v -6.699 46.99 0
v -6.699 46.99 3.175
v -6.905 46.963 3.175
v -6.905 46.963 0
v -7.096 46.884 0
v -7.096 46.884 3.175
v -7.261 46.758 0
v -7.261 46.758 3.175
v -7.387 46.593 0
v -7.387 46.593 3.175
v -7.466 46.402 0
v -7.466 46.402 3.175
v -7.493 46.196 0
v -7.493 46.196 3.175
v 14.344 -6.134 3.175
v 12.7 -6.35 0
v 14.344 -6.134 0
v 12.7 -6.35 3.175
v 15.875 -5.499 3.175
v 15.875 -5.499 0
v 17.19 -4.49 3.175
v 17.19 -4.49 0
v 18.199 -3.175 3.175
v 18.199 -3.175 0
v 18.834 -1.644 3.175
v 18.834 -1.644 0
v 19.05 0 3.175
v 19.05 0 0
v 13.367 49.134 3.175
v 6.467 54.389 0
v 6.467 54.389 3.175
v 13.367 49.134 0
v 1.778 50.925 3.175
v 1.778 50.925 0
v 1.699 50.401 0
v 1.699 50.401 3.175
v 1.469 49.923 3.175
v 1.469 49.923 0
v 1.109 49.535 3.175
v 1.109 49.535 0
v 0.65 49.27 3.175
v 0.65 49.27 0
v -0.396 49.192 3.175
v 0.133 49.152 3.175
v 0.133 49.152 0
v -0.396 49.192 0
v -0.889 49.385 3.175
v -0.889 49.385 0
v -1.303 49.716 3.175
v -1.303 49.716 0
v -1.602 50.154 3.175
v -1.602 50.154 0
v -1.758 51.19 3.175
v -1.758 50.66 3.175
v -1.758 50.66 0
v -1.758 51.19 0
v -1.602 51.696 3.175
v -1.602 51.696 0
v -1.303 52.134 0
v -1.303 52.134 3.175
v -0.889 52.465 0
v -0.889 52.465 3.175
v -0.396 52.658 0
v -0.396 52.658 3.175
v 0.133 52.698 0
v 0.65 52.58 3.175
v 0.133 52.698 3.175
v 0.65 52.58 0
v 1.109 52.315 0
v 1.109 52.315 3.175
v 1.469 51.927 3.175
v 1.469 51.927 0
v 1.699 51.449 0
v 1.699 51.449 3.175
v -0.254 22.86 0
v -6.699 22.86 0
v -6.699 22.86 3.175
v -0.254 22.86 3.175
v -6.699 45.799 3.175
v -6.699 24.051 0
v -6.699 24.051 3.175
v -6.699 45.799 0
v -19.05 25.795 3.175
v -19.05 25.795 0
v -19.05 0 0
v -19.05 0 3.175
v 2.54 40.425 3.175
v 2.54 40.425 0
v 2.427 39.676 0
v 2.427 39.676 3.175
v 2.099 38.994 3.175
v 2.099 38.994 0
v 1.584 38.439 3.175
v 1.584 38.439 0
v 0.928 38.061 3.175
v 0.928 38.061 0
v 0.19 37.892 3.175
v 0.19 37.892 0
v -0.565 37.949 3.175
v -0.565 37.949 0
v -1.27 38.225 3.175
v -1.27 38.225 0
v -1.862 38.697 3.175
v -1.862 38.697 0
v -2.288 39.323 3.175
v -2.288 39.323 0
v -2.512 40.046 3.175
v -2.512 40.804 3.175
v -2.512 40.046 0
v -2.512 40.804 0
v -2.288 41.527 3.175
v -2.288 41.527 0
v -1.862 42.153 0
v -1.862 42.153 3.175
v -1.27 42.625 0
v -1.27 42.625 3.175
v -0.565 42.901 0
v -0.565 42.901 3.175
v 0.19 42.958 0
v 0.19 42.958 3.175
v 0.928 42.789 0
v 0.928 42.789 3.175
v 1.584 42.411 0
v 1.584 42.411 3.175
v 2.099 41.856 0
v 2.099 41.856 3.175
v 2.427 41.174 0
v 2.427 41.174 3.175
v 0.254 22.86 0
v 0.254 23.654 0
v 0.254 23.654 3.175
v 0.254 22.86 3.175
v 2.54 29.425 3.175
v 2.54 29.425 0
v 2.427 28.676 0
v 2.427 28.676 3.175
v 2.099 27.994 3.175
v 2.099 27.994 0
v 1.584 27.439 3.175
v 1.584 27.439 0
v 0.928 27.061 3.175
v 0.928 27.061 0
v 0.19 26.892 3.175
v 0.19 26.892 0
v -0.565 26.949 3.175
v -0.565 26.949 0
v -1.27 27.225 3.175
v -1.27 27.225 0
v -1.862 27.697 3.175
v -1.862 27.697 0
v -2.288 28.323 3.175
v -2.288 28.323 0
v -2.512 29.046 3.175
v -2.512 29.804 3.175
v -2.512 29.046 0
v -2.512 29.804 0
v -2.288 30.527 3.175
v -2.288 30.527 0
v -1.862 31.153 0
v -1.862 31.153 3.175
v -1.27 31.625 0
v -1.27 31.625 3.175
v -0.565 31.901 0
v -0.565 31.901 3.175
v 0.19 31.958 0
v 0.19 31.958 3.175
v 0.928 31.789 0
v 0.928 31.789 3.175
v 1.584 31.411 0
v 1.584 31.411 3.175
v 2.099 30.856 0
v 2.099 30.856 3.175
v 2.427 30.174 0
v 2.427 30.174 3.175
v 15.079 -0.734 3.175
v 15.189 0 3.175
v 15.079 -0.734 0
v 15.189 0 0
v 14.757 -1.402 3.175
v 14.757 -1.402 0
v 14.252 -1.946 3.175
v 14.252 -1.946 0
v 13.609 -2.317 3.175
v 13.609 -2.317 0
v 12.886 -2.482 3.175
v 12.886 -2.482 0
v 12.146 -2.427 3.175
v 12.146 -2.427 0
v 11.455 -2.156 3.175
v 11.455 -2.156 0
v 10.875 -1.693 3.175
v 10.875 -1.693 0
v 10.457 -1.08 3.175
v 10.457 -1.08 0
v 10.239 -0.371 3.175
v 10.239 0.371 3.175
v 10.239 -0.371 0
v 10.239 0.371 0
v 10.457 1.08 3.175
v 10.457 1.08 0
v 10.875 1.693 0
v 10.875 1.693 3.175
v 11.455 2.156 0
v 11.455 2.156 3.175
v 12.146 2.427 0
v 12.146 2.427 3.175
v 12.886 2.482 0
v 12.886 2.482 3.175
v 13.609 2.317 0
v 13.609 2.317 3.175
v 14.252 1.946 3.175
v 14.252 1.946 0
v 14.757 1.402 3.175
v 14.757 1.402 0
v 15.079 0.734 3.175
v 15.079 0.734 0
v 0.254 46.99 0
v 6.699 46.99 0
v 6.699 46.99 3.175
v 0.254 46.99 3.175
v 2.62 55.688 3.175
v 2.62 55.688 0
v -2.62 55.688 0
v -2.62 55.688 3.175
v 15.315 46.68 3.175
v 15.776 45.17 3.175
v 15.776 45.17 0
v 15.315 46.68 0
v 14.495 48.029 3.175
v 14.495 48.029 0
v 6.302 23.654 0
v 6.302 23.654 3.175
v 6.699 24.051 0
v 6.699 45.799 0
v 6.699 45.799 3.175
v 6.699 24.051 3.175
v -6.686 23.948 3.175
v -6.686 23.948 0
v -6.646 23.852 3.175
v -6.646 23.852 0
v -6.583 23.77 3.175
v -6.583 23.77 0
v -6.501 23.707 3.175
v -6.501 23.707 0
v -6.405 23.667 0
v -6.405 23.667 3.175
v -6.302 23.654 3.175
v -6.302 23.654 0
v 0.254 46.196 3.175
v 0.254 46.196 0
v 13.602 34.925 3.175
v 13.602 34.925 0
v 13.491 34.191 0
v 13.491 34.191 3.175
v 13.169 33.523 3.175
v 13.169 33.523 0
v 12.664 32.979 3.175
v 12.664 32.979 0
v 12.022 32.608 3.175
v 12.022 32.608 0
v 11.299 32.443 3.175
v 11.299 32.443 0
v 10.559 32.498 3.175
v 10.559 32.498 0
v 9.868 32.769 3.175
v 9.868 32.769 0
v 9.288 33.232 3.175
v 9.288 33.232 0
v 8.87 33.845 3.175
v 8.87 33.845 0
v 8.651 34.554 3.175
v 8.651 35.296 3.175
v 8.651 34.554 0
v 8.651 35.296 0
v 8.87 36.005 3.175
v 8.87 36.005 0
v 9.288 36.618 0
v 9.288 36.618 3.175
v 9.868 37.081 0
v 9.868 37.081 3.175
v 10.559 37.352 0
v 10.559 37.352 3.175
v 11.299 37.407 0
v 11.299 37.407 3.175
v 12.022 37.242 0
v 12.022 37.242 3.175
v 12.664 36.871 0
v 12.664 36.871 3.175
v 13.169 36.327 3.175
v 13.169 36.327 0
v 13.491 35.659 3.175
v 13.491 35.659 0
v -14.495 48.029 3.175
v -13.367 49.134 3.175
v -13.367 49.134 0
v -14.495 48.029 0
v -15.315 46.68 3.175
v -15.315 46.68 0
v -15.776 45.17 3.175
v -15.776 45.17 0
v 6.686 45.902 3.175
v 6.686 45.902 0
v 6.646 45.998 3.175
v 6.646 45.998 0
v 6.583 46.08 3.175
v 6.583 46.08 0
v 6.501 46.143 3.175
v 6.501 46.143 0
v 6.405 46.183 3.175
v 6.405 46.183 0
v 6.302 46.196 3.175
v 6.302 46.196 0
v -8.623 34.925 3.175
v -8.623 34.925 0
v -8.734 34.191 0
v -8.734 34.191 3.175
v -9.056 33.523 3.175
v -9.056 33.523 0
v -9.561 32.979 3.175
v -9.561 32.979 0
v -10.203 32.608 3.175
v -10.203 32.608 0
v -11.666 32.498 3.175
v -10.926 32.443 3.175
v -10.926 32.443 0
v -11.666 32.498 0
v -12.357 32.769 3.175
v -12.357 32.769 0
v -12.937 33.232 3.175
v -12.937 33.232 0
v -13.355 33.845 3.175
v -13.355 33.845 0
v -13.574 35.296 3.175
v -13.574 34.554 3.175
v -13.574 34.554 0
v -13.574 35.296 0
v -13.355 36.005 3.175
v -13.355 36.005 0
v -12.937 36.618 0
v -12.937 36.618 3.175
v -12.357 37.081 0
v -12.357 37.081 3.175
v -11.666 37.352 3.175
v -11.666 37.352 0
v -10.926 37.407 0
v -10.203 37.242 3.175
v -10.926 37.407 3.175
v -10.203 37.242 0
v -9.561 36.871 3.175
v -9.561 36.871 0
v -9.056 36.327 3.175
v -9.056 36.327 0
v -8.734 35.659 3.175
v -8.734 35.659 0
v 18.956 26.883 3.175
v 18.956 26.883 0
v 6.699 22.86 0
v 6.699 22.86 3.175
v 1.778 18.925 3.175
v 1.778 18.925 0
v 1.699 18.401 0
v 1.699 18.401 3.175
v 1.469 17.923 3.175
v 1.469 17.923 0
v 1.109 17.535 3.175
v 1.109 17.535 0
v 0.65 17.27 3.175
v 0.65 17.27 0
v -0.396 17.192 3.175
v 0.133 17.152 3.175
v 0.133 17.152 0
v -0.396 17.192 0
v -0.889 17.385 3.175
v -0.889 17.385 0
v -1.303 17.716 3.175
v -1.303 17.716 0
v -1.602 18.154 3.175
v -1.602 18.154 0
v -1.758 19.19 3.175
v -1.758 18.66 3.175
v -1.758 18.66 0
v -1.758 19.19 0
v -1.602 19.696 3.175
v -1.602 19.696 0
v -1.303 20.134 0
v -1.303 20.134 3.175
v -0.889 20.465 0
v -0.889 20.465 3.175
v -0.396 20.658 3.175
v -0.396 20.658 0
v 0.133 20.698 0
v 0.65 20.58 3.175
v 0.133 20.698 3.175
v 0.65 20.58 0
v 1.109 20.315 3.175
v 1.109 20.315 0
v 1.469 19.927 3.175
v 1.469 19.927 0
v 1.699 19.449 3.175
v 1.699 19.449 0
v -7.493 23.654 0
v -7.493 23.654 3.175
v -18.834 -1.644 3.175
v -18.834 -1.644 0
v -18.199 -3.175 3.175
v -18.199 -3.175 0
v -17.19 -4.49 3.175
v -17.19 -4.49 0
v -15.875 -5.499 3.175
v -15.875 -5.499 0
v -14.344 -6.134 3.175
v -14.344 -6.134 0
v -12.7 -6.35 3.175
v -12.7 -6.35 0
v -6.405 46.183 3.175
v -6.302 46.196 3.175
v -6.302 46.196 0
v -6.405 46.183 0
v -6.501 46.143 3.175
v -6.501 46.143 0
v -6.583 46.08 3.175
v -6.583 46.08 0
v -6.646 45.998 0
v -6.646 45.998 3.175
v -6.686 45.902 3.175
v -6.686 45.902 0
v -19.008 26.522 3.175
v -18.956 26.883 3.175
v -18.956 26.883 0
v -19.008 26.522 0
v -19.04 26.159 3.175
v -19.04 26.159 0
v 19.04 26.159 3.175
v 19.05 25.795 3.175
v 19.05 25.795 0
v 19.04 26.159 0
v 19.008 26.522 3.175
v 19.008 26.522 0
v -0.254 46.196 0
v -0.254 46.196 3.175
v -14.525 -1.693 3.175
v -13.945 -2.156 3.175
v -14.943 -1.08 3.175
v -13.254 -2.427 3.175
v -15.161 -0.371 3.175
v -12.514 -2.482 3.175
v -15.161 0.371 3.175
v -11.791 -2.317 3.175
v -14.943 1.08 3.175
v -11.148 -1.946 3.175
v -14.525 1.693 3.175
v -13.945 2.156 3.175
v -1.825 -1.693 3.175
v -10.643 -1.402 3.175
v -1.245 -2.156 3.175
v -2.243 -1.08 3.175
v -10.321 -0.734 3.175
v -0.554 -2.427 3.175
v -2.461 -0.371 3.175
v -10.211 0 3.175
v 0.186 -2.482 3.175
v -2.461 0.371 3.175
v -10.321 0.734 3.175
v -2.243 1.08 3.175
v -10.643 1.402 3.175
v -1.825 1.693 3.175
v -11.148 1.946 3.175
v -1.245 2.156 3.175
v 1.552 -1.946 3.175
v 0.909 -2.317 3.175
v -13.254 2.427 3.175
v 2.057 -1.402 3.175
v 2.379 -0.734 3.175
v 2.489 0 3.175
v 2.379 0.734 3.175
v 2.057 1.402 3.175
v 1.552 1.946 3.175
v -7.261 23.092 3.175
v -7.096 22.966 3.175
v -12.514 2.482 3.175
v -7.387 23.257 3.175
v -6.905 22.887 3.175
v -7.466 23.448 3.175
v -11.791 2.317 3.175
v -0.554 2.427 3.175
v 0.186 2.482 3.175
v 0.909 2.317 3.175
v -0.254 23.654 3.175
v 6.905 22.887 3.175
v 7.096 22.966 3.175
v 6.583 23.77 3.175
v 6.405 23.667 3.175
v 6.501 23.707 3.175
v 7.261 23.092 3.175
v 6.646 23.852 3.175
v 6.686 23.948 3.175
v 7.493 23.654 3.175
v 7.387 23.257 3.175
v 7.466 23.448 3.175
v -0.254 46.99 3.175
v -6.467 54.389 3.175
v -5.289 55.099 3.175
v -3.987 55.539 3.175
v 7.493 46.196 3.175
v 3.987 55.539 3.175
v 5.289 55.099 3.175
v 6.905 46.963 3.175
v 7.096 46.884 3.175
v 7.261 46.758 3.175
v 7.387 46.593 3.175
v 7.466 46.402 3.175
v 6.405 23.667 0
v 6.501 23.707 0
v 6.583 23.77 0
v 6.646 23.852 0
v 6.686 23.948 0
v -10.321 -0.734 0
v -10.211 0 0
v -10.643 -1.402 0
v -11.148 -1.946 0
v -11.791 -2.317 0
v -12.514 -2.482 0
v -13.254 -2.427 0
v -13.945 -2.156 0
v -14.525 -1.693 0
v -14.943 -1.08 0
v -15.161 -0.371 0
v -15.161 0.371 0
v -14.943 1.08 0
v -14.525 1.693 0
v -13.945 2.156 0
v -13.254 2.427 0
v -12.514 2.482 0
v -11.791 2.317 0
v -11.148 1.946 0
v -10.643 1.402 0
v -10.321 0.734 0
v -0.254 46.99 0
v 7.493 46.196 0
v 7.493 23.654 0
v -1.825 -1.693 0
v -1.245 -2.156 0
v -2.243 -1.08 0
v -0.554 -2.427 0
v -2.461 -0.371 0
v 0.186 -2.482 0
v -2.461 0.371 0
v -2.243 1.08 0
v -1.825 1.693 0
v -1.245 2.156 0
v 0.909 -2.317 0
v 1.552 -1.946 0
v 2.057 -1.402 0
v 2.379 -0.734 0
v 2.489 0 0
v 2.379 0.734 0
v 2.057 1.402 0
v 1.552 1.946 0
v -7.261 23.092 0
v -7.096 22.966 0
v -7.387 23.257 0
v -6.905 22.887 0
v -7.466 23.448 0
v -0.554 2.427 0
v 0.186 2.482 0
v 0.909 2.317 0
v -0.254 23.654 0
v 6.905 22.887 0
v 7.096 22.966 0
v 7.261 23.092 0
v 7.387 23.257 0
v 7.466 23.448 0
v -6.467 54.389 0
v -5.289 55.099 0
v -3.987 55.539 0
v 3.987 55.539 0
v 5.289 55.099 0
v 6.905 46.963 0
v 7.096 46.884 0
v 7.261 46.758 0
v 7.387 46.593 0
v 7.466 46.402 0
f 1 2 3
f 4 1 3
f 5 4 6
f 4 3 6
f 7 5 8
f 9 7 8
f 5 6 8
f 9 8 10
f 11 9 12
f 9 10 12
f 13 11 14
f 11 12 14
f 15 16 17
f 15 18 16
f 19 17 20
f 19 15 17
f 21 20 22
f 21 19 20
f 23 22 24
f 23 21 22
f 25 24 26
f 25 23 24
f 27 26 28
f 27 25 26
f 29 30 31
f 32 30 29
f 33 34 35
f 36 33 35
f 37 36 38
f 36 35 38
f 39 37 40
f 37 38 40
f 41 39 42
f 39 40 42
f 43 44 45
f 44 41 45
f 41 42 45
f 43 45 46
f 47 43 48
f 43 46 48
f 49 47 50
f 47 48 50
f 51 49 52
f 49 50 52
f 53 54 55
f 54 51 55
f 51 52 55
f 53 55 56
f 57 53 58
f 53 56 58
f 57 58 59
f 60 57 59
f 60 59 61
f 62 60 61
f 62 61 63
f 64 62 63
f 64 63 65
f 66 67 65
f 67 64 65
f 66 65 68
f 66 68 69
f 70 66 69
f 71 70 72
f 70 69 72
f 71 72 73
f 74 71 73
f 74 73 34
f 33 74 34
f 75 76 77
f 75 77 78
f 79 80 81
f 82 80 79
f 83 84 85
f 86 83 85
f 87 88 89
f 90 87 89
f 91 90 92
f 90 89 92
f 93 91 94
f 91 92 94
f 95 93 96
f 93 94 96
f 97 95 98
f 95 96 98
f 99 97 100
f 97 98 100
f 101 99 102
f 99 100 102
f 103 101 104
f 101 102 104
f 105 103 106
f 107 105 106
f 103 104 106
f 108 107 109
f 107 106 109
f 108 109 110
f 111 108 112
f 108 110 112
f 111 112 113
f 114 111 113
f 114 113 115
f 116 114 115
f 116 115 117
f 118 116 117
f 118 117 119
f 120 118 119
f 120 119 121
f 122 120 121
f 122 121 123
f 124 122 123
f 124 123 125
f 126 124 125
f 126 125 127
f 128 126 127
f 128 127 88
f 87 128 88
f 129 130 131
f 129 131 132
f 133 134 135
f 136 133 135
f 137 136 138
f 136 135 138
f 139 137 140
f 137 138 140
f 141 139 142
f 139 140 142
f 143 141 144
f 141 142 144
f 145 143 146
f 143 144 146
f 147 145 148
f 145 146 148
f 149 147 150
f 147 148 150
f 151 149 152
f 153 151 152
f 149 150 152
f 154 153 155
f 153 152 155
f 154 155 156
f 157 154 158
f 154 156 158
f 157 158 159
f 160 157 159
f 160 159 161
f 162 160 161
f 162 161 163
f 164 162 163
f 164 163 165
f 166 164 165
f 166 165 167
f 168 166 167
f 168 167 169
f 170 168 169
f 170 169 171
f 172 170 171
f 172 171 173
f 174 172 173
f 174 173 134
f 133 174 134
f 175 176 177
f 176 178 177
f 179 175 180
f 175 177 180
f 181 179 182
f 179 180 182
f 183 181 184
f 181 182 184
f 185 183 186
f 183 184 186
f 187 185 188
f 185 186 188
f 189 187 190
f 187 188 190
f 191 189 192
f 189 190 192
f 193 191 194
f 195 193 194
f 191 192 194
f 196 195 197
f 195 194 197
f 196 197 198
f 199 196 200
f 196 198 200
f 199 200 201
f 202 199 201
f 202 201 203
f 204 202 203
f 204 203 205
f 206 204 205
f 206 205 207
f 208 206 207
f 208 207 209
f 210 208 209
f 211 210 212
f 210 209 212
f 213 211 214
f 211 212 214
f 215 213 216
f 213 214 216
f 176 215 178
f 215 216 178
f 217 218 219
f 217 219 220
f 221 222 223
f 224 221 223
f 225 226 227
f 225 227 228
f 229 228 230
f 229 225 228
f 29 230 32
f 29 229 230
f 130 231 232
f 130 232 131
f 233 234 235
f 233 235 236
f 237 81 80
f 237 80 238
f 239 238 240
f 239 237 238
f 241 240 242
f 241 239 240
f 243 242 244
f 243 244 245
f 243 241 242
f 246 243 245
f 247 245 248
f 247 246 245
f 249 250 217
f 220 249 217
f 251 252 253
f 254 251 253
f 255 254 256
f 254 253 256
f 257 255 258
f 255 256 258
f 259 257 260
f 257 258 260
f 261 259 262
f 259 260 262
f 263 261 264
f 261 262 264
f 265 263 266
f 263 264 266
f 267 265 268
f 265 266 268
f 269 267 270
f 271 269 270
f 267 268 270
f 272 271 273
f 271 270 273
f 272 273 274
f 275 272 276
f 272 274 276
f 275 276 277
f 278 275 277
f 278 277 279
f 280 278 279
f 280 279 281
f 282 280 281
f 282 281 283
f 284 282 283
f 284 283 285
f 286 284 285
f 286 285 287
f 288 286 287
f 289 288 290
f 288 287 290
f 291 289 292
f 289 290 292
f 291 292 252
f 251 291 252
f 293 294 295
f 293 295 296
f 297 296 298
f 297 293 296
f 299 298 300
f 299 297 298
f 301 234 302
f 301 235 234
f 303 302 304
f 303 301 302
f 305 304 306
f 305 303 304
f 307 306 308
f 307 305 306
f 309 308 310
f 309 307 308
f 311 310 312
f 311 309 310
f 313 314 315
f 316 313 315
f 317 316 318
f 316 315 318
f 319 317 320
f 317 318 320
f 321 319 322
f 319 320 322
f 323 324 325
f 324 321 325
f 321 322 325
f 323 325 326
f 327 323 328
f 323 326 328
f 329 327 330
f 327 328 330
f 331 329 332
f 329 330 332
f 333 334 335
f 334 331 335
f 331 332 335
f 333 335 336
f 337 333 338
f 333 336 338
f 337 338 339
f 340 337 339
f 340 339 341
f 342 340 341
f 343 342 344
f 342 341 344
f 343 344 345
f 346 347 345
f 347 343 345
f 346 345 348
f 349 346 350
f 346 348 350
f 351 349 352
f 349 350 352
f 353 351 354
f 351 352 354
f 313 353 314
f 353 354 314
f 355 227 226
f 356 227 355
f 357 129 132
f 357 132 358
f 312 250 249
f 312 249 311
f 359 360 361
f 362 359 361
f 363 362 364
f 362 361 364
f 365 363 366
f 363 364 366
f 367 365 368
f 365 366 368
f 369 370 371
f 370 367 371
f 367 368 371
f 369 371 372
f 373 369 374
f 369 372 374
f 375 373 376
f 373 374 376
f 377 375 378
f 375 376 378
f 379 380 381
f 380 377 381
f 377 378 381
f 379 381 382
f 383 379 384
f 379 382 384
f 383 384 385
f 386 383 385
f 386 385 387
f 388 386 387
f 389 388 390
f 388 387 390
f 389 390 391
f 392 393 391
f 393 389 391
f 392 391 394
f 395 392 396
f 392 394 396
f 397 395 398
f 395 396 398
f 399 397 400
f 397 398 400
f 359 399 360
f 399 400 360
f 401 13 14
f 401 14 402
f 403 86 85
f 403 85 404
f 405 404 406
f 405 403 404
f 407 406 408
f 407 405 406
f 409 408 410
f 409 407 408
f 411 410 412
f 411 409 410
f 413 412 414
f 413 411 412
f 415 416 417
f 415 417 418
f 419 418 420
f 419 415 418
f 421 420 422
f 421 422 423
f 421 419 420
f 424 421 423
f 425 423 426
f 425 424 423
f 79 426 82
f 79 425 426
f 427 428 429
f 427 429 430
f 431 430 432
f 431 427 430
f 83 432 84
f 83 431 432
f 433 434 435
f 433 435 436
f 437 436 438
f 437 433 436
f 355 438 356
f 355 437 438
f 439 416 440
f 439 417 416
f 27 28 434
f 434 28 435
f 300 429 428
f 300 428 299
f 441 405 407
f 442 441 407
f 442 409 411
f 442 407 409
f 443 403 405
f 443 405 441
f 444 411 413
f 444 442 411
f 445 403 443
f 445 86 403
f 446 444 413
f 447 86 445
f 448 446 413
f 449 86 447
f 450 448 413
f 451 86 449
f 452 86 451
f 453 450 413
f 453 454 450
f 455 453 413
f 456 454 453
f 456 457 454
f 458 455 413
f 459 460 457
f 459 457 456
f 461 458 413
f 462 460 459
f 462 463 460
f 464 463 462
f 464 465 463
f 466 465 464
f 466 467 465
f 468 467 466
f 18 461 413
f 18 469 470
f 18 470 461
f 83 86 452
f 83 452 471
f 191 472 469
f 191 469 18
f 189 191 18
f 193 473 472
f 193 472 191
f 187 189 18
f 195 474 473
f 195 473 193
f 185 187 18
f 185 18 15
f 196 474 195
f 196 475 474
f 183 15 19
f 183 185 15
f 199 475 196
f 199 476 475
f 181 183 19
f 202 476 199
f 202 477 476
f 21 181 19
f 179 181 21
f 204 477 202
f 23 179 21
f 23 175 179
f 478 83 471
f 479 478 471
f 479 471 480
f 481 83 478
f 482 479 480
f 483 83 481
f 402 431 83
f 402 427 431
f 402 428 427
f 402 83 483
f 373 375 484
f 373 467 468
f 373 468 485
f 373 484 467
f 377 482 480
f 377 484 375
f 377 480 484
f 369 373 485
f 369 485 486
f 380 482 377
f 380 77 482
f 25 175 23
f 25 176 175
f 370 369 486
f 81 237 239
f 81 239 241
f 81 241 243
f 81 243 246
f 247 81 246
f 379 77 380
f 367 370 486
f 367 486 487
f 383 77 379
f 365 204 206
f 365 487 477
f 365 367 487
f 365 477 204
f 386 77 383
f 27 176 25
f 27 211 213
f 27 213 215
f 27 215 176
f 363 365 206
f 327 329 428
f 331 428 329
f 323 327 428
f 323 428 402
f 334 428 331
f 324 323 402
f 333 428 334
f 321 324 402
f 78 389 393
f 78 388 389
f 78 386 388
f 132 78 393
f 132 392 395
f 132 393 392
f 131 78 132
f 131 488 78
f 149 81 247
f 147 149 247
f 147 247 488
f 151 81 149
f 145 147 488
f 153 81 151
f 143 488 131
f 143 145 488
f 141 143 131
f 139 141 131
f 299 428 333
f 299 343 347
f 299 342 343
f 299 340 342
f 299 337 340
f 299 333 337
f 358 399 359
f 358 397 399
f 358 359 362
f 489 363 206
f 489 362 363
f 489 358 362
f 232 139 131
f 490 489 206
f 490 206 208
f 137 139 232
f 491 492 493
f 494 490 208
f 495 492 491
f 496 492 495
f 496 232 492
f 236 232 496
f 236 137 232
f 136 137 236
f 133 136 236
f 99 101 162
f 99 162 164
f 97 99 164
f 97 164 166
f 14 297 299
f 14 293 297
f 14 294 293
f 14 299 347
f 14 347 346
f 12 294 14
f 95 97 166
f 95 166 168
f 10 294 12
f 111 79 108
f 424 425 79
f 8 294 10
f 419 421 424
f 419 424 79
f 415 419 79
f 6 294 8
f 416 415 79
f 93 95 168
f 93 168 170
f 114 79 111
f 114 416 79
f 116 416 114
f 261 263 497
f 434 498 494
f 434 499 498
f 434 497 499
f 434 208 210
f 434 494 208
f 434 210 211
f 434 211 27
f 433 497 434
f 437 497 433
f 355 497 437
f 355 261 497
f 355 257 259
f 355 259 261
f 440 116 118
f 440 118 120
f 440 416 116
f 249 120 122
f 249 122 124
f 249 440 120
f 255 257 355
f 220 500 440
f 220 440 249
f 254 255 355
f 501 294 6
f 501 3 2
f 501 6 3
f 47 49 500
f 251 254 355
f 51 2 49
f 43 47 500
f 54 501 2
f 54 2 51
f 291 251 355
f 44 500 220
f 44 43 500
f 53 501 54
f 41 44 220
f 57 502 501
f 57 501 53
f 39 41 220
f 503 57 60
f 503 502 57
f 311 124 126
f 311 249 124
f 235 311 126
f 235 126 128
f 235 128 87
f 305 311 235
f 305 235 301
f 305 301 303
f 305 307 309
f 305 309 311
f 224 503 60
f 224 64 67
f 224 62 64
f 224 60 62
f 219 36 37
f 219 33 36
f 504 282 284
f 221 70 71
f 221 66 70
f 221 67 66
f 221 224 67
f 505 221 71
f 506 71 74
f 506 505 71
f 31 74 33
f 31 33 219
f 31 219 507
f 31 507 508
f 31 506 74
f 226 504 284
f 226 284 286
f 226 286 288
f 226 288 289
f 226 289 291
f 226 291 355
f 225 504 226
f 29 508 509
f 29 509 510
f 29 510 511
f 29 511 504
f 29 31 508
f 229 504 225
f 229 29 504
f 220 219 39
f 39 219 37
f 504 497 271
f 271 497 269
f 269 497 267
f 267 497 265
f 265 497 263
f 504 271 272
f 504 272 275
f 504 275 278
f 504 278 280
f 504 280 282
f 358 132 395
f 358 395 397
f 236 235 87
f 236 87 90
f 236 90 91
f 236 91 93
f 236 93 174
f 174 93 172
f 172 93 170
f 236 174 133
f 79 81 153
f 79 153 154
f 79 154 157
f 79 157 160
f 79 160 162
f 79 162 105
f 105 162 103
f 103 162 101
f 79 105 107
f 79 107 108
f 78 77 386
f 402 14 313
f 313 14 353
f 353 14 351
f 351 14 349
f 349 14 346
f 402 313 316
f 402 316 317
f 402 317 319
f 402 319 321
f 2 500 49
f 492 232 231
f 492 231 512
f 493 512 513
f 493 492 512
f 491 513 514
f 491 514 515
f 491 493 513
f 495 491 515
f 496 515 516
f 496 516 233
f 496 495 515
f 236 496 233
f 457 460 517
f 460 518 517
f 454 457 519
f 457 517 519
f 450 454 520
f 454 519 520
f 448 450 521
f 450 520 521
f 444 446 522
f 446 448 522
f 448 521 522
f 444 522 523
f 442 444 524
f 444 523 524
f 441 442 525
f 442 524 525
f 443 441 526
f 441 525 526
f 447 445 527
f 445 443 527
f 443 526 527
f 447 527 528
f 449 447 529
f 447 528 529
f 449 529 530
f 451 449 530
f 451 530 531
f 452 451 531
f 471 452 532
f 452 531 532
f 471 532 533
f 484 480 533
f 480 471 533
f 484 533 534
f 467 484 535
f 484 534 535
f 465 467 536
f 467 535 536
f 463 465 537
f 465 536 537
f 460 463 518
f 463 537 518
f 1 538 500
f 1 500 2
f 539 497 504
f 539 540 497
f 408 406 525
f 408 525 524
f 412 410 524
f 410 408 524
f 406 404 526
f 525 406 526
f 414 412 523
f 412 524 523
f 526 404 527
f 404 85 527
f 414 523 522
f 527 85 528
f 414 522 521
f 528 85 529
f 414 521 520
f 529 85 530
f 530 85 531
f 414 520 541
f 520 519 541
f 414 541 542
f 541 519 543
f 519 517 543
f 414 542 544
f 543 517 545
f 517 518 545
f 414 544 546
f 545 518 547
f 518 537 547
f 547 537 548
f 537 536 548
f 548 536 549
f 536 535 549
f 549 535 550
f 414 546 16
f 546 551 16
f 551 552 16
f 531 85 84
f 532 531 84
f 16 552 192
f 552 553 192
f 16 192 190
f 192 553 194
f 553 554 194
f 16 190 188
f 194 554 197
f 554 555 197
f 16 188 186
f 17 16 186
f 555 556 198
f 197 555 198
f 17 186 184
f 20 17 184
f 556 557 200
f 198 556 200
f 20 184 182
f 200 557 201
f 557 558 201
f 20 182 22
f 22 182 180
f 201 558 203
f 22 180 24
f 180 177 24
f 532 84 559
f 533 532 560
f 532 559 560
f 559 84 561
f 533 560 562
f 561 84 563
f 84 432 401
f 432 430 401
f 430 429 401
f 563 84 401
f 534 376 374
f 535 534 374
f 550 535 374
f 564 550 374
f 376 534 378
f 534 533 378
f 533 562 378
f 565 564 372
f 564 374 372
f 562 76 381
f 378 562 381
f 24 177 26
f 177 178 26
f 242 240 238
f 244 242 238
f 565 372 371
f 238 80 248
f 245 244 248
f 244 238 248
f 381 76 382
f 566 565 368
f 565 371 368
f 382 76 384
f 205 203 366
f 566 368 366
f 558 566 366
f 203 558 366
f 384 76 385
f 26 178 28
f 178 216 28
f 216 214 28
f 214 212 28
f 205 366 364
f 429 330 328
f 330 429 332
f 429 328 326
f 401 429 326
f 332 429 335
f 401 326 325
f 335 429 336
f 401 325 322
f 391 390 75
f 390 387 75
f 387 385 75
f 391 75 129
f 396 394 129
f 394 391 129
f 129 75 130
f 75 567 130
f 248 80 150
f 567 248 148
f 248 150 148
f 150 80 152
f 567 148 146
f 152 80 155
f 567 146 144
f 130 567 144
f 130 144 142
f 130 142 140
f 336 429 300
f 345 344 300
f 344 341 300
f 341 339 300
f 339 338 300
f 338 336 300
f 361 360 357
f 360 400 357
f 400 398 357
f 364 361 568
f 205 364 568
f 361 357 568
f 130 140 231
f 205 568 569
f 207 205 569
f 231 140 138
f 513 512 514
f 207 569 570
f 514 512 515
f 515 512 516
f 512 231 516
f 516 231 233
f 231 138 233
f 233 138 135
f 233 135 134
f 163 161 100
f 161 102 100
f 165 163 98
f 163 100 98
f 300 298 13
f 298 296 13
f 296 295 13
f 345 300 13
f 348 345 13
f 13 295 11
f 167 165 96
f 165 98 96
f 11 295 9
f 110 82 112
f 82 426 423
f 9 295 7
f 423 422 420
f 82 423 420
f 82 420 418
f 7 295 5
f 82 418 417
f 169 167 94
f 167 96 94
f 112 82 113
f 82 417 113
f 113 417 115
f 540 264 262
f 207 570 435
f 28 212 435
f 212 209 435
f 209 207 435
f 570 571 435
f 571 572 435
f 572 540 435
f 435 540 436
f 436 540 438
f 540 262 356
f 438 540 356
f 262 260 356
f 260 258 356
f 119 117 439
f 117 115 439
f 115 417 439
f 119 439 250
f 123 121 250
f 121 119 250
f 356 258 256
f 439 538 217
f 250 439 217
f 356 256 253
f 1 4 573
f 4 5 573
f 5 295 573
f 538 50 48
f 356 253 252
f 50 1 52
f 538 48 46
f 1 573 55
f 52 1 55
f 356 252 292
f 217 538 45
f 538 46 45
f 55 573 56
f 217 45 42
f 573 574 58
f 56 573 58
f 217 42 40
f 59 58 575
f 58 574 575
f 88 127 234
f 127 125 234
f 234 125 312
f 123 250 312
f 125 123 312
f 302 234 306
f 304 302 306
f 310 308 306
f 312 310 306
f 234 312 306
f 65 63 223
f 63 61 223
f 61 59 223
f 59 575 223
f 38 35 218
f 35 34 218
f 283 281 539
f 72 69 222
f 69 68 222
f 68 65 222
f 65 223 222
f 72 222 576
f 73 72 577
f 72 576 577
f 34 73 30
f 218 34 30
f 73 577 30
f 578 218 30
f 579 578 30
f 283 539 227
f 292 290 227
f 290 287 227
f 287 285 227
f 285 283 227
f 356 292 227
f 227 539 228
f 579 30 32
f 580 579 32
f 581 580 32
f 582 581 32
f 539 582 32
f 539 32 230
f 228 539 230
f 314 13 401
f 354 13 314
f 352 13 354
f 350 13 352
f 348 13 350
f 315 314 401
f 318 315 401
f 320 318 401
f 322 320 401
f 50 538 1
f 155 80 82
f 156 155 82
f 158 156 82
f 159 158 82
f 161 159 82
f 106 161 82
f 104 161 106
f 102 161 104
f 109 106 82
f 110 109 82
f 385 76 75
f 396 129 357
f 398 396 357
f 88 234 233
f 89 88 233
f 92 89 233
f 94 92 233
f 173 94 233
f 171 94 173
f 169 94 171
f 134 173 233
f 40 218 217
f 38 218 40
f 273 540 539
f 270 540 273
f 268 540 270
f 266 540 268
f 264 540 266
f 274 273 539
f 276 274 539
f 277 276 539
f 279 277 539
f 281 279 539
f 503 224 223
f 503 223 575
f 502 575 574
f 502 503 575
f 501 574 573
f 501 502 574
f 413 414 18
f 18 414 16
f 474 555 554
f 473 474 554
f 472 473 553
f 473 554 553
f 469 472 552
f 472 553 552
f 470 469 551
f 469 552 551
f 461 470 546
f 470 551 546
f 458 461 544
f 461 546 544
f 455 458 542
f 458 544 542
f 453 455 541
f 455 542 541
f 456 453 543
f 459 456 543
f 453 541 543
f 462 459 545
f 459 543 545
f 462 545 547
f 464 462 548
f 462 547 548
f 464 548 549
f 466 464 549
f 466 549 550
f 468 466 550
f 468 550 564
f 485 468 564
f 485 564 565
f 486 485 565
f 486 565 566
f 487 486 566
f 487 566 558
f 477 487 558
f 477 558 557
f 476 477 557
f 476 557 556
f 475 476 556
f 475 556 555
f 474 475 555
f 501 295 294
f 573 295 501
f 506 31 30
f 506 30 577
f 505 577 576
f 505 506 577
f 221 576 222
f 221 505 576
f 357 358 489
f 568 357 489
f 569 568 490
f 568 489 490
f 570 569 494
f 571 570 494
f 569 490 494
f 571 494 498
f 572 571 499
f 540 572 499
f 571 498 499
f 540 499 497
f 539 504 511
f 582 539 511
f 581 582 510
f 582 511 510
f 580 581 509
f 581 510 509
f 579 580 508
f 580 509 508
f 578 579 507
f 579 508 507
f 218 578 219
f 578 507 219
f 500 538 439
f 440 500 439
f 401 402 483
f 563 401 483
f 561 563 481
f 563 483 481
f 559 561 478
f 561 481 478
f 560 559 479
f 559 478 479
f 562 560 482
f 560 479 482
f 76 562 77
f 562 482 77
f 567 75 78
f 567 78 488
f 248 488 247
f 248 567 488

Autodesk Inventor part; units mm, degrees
ref_plane "YZ Plane" through (0, 0, 0) normal (1, 0, 0) x (0, 1, 0)
ref_plane "XZ Plane" through (0, 0, 0) normal (0, 1, 0) x (-1, 0, 0)
ref_plane "XY Plane" through (0, 0, 0) normal (0, 0, 1) x (1, 0, 0)
sketch "Sketch1" plane through (0, 0, 0) normal (0, 0, 1) x (1, 0, 0)
  line L0 (19.05, 12.7) -> (-19.05, 12.7)
  line L1 (-19.05, 12.7) -> (-19.05, -12.7)
  line L2 (-19.05, -12.7) -> (19.05, -12.7)
  line L3 (19.05, -12.7) -> (19.05, 12.7)
  circle A0 centre (-12.7, 0) radius 2.4892
  line L4 (-12.7, 0) -> (12.7, 0)
  circle A1 centre (12.7, 0) radius 2.4892
  line L5 (-19.05, -6.35) -> (19.05, -6.35)
  circle A2 centre (-11.1125, 34.925) radius 2.4892
  line L6 (-11.1125, 34.925) -> (11.1125, 34.925)
  circle A3 centre (11.1125, 34.925) radius 2.4892
  line L7 (-19.05, 12.7) -> (-19.05, 26.343)
  line L8 (-19.05, 26.343) -> (-15.3495, 47.625)
  line L9 (-15.3495, 47.625) -> (15.3495, 47.625)
  line L10 (15.3495, 47.625) -> (19.05, 26.343)
  line L11 (19.05, 26.343) -> (19.05, 12.7)
  circle A4 centre (-11.1125, 34.925) radius 6.35 construction
  circle A5 centre (0, 29.425) radius 2.54
  circle A6 centre (0, 40.425) radius 2.54
  line L12 (0, 40.425) -> (0, 29.425)
  circle A7 centre (0, 0) radius 2.4892
  line L13 (7.493, 46.99) -> (-7.493, 46.99)
  line L14 (-7.493, 46.99) -> (-7.493, 22.86)
  line L15 (-7.493, 22.86) -> (7.493, 22.86)
  line L16 (7.493, 22.86) -> (7.493, 46.99)
  line L17 (7.493, 46.99) -> (-7.493, 22.86) construction
  line L18 (-7.493, 46.99) -> (7.493, 22.86) construction
  circle A8 centre (0, 50.925) radius 1.778
  circle A9 centre (0, 18.925) radius 1.778
  line L19 (-15.3495, 47.625) -> (-4.7625, 55.6875)
  line L20 (4.7625, 55.6875) -> (15.3495, 47.625)
  line L21 (-7.493, 34.925) -> (7.493, 34.925) construction
  line L22 (-7.493, 37.3062) -> (7.493, 37.3062)
  line L23 (-7.493, 34.1313) -> (7.493, 34.1313)
  line L24 (4.7625, 55.6875) -> (-4.7625, 55.6875)
  line L25 (7.493, 37.3062) -> (7.493, 34.1313)
  line L26 (-7.493, 37.3062) -> (-7.493, 34.1313)
  line L27 (-6.6992, 46.1963) -> (6.6992, 46.1963)
  line L28 (6.6992, 46.1963) -> (6.6992, 23.6537)
  line L29 (6.6992, 23.6537) -> (-6.6992, 23.6537)
  line L30 (-6.6992, 23.6537) -> (-6.6992, 46.1963)
  line L31 (0.254, 46.99) -> (-0.254, 46.99)
  line L32 (-0.254, 46.99) -> (-0.254, 46.1963)
  line L33 (-0.254, 46.1963) -> (0.254, 46.1963)
  line L34 (0.254, 46.1963) -> (0.254, 46.99)
  line L35 (0.254, 46.99) -> (-0.254, 46.1963) construction
  line L36 (-0.254, 46.99) -> (0.254, 46.1963) construction
  line L37 (0.254, 22.86) -> (-0.254, 22.86)
  line L38 (-0.254, 22.86) -> (-0.254, 23.6537)
  line L39 (-0.254, 23.6537) -> (0.254, 23.6537)
  line L40 (0.254, 23.6537) -> (0.254, 22.86)
  line L41 (0.254, 22.86) -> (-0.254, 23.6537) construction
  line L42 (-0.254, 22.86) -> (0.254, 23.6537) construction
  point P0 (0, 12.7)
  point P1 (0, 47.625)
  point P2 (0, 34.925)
  point P3 (0, 34.925)
  point P4 (0, 34.925)
  point P5 (-7.493, 34.1313)
  point P6 (7.493, 34.1313)
  point P7 (7.493, 37.3062)
  point P8 (-7.493, 37.3062)
  point P9 (0, 55.6875)
  point P10 (0, -12.7)
  point P11 (0, 46.5931)
  point P12 (0, 46.5931)
  point P13 (0, 23.2569)
  point P14 (0, 23.2569)
  dimension "d0" = 38.1
  dimension "d1" = 25.4
  dimension "d2" = 4.9784
  dimension "d3" = 4.9784
  dimension "d4" = 25.4
  dimension "d5" = 6.35
  dimension "d6" = 4.9784
  dimension "d7" = 22.225
  dimension "d8" = 22.225
  dimension "d9" = 21.282
  dimension "d10" = 12.7
  dimension "d11" = 12.7
  dimension "d12" = 5.08
  dimension "d13" = 11
  dimension "d17" = 24.13
  dimension "d18" = 14.986
  dimension "d19" = 3.556
  dimension "d22" = 360
  dimension "d24" = 32
  dimension "d29" = 0.7937
  dimension "d31" = 3.175
  dimension "d32" = 4.7625
  dimension "d33" = 9.525
  dimension "d51" = 12.7
  dimension "d52" = 6.35
  dimension "d53" = 0.7937
  dimension "d54" = 0.508
extrude "Plate1" add sketch "Sketch1" along normal blind 3.175 contours L3 L5 L1 L0 | L0 L7 L8 L9 L10 L11 | L9 L19 L24 L20 | L30 L22 L12 L6 | L6 L12 L23 L30 | L12 L22 L28 L6 | L6 L28 L23 L12 | L23 L28 L29 L30 | L30 L27 L28 L22 | L13 L34 L27 L32 | L38 L29 L40 L15
fillet "Corner Round2" radius 6.35 8 edges at (19.05, -6.35, 1.5875) (-19.05, -6.35, 1.5875) (19.05, 26.343, 1.5875) (-15.3495, 47.625, 1.5875) (-4.7625, 55.6875, 1.5875) (4.7625, 55.6875, 1.5875) (15.3495, 47.625, 1.5875) (-19.05, 26.343, 1.5875)
cut "Cut1" [suppressed]
fillet "Corner Round3" radius 0.7937 4 edges at (-7.493, 46.99, 1.5875) (-7.493, 22.86, 1.5875) (7.493, 22.86, 1.5875) (7.493, 46.99, 1.5875)
fillet "Corner Round4" radius 0.3969 4 edges at (6.6992, 46.1963, 1.5875) (-6.6992, 46.1963, 1.5875) (-6.6992, 23.6537, 1.5875) (6.6992, 23.6537, 1.5875)
sketch "Sketch4" plane through (0, 0, 3.175) normal (0, 0, 1) x (1, 0, 0)
  line L0 (0.254, 46.99) -> (6.6992, 46.99) projected
  arc A0 (7.493, 46.1963) -> (6.6992, 46.99) centre (6.6992, 46.1963) ccw projected
  line L1 (7.493, 46.1963) -> (7.493, 23.6538) projected
  arc A1 (6.6992, 22.86) -> (7.493, 23.6538) centre (6.6992, 23.6538) ccw projected
  line L2 (6.6992, 22.86) -> (0.254, 22.86) projected
  arc A2 (-7.493, 23.6538) -> (-6.6993, 22.86) centre (-6.6993, 23.6538) ccw projected
  line L3 (-7.493, 23.6538) -> (-7.493, 46.1963) projected
  arc A3 (-6.6993, 46.99) -> (-7.493, 46.1963) centre (-6.6993, 46.1963) ccw projected
  arc A4 (-18.9561, 26.8828) -> (-19.05, 25.795) centre (-12.7, 25.795) ccw projected
  line L4 (-19.05, 0) -> (-19.05, 25.795) projected
  arc A5 (-19.05, 0) -> (-12.7, -6.35) centre (-12.7, 0) ccw projected
  line L5 (12.7, -6.35) -> (-12.7, -6.35) projected
  arc A6 (12.7, -6.35) -> (19.05, 0) centre (12.7, 0) ccw projected
  line L6 (19.05, 25.795) -> (19.05, 0) projected
  arc A7 (19.05, 25.795) -> (18.9561, 26.8828) centre (12.7, 25.795) ccw projected
  line L7 (15.7763, 45.1704) -> (18.9561, 26.8828) projected
  arc A8 (15.7763, 45.1704) -> (13.3674, 49.1345) centre (9.5202, 44.0826) ccw projected
  line L8 (6.4671, 54.3894) -> (13.3674, 49.1345) projected
  arc A9 (6.4671, 54.3894) -> (2.6199, 55.6875) centre (2.6199, 49.3375) ccw projected
  line L9 (-2.6199, 55.6875) -> (2.6199, 55.6875) projected
  arc A10 (-2.6199, 55.6875) -> (-6.4671, 54.3894) centre (-2.6199, 49.3375) ccw projected
  line L10 (-13.3674, 49.1345) -> (-6.4671, 54.3894) projected
  arc A11 (-13.3674, 49.1345) -> (-15.7763, 45.1704) centre (-9.5202, 44.0826) ccw projected
  line L11 (-18.9561, 26.8828) -> (-15.7763, 45.1704) projected
  circle A12 centre (11.1125, 34.925) radius 2.4892 projected
  circle A13 centre (-11.1125, 34.925) radius 2.4892 projected
  circle A14 centre (0, 18.925) radius 1.778 projected
  circle A15 centre (0, 0) radius 2.4892 projected
  circle A16 centre (12.7, 0) radius 2.4892 projected
  circle A17 centre (-12.7, 0) radius 2.4892 projected
  circle A18 centre (0, 50.925) radius 1.778 projected
  line L12 (-27.7407, 9.4742) -> (24.6669, 9.4742)
  arc A19 (-11.4438, 46.6085) -> (-12.6483, 44.6265) centre (-9.5202, 44.0826) ccw
  line L13 (-11.4438, 46.6085) -> (-4.5435, 51.8634)
  arc A20 (-2.6199, 52.5125) -> (-4.5435, 51.8634) centre (-2.6199, 49.3375) ccw
  line L14 (-2.6199, 52.5125) -> (2.6199, 52.5125)
  arc A21 (4.5435, 51.8634) -> (2.6199, 52.5125) centre (2.6199, 49.3375) ccw
  line L15 (4.5435, 51.8634) -> (11.4438, 46.6085)
  arc A22 (12.6483, 44.6265) -> (11.4438, 46.6085) centre (9.5202, 44.0826) ccw
  line L16 (12.6483, 44.6265) -> (15.8281, 26.3389)
  arc A23 (15.875, 25.795) -> (15.8281, 26.3389) centre (12.7, 25.795) ccw
  line L17 (15.875, 25.795) -> (15.875, 0)
  arc A24 (12.7, -3.175) -> (15.875, 0) centre (12.7, 0) ccw
  line L18 (12.7, -3.175) -> (-12.7, -3.175)
  arc A25 (-15.875, 0) -> (-12.7, -3.175) centre (-12.7, 0) ccw
  line L19 (-15.875, 0) -> (-15.875, 25.795)
  arc A26 (-15.8281, 26.3389) -> (-15.875, 25.795) centre (-12.7, 25.795) ccw
  line L20 (-15.8281, 26.3389) -> (-12.6483, 44.6265)
  line L21 (-8.6233, 15.877) -> (8.6233, 15.877)
  line L22 (8.6233, 15.877) -> (15.8281, 26.3389)
  line L23 (-8.6233, 15.877) -> (-15.8281, 26.3389)
  line L24 (-8.6233, 15.877) -> (-8.6233, 5.6134)
  line L25 (-8.6233, 5.6134) -> (-15.875, 5.6134)
  line L26 (8.6233, 15.877) -> (8.6233, 5.6134)
  line L27 (8.6233, 5.6134) -> (15.875, 5.6134)
  line L28 (-10.0711, 17.9793) -> (-10.0711, 5.6134)
  line L29 (10.0711, 17.9793) -> (10.0711, 5.6134)
  arc A27 (6.3024, 23.6537) -> (6.6992, 24.0506) centre (6.3024, 24.0506) ccw projected
  line L30 (6.6992, 45.7994) -> (6.6992, 24.0506) projected
  arc A28 (6.6992, 45.7994) -> (6.3024, 46.1963) centre (6.3024, 45.7994) ccw projected
  line L31 (0.254, 46.1963) -> (6.3024, 46.1963) projected
  line L32 (0.254, 46.99) -> (0.254, 46.1963) projected
  line L33 (0.254, 23.6537) -> (0.254, 22.86) projected
  line L34 (6.3024, 23.6537) -> (0.254, 23.6537) projected
  arc A29 (-6.6992, 24.0506) -> (-6.3024, 23.6537) centre (-6.3024, 24.0506) ccw projected
  line L35 (-0.254, 23.6537) -> (-6.3024, 23.6537) projected
  line L36 (-0.254, 22.86) -> (-0.254, 23.6537) projected
  line L37 (-0.254, 22.86) -> (-6.6993, 22.86) projected
  line L38 (-6.6993, 46.99) -> (-0.254, 46.99) projected
  line L39 (-0.254, 46.1963) -> (-0.254, 46.99) projected
  line L40 (-6.3024, 46.1963) -> (-0.254, 46.1963) projected
  arc A30 (-6.3024, 46.1963) -> (-6.6992, 45.7994) centre (-6.3024, 45.7994) ccw projected
  line L41 (-6.6992, 24.0506) -> (-6.6992, 45.7994) projected
  point P0 (0, 15.877)
  dimension "d59" = 9.4742
  dimension "d60" = 3.175
  dimension "d61" = 17.2466
  dimension "d62" = 3.048
  dimension "d63" = 1.4478
  dimension "d67" = 5.6134
cut "Cut2" [suppressed]
feature "Corner Round5" [suppressed]
equation "\"d55\" = Thickness"
equation "\"d64\" = Thickness"
equation "\"d35\" = Thickness"
equation "\"BendReliefWidth\" = Thickness"
equation "\"BendReliefDepth\" = 0.5 * Thickness"
equation "\"CornerReliefSize\" = 4 * Thickness"
equation "\"MinimumRemnant\" = 2 * Thickness"
equation "\"TransitionRadius\" = BendRadius"
equation "\"JacobiRadiusSize\" = BendRadius"
equation "\"GapSize\" = Thickness"
equation "\"Thickness\" = 3.175"
equation "\"BendRadius\" = 0.79375"
properties part number "Standard Sensor Mount" material "Aluminum 6061"
